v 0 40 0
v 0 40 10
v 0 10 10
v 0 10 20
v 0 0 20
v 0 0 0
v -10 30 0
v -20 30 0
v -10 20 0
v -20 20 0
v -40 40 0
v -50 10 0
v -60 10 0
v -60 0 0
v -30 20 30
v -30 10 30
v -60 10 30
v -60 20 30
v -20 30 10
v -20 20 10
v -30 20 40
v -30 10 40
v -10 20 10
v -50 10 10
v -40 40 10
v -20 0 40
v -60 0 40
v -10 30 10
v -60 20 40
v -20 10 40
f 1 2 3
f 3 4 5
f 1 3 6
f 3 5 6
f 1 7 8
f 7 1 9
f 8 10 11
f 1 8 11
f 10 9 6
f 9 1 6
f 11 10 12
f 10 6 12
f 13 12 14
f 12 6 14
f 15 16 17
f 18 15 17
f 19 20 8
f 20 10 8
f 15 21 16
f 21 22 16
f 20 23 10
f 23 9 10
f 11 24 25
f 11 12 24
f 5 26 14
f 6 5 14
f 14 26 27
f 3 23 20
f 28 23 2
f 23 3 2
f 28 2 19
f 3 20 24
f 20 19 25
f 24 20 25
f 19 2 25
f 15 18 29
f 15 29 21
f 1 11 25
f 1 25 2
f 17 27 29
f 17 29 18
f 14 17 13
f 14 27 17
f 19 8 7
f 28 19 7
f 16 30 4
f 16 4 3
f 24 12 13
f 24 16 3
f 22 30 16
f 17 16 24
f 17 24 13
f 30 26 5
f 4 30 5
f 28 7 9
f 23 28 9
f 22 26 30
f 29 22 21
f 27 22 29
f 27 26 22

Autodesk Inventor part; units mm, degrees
ref_plane "YZ Plane" through (0, 0, 0) normal (1, 0, 0) x (0, 1, 0)
ref_plane "XZ Plane" through (0, 0, 0) normal (0, 1, 0) x (-1, 0, 0)
ref_plane "XY Plane" through (0, 0, 0) normal (0, 0, 1) x (1, 0, 0)
sketch "草圖1" plane through (0, 0, 0) normal (0, 1, 0) x (-1, 0, 0)
  line L0 (0, 0) -> (60, 0)
  line L1 (60, 0) -> (60, 40)
  line L2 (60, 40) -> (0, 40)
  line L3 (0, 40) -> (0, 0)
  line L4 (20, 40) -> (0, 20)
  dimension "d0" = 60
  dimension "d1" = 40
  dimension "d2" = 20
  dimension "d3" = 20
extrude "擠出1" add sketch "草圖1" along normal blind 10 contours L3 L4 L2 L1 L0
sketch "草圖2" plane through (0, 0, 0) normal (0, 0, -1) x (-1, 0, 0)
  line L0 (0, 0) -> (0, 10) projected
  line L1 (0, 10) -> (60, 10) projected
  line L2 (60, 10) -> (60, 0) projected
  line L3 (60, 0) -> (0, 0) projected
  line L4 (50, 10) -> (40, 40)
  line L5 (40, 40) -> (0, 40)
  line L6 (0, 40) -> (0, 10)
  line L7 (20, 30) -> (10, 30)
  line L8 (10, 30) -> (10, 20)
  line L9 (10, 20) -> (20, 20)
  line L10 (20, 20) -> (20, 30)
  dimension "d6" = 10
  dimension "d7" = 40
  dimension "d8" = 40
  dimension "d9" = 10
  dimension "d10" = 10
  dimension "d11" = 10
extrude "擠出2" add sketch "草圖2" against normal blind 10 contours L6 L5 L4 L1
sketch "草圖3" plane through (0, 10, 0) normal (0, 1, 0) x (1, 0, 0)
  line L0 (-20, -40) -> (-60, -40) projected
  line L1 (-60, -40) -> (-60, 0) projected
  line L2 (-60, 0) -> (-50, 0) projected
  line L3 (-50, -10) -> (-50, 0) projected
  line L4 (0, -10) -> (-50, -10) projected
  line L5 (0, 0) -> (0, -10) projected
  line L6 (-50, 0) -> (0, 0) projected
  line L7 (0, -20) -> (-20, -40) projected
  line L8 (0, -10) -> (0, -20) projected
  line L9 (-60, 0) -> (-60, -40) projected
  line L10 (-60, -40) -> (-30, -40)
  line L11 (-30, -40) -> (-30, -30)
  line L12 (-30, -30) -> (-60, -30)
  line L13 (-60, -30) -> (-60, -40)
  dimension "d14" = 10
  dimension "d15" = 30
extrude "擠出3" add sketch "草圖3" along normal blind 10 contours L0 L1 L12 L11
properties part number "12" material "鋼、碳鋼"
